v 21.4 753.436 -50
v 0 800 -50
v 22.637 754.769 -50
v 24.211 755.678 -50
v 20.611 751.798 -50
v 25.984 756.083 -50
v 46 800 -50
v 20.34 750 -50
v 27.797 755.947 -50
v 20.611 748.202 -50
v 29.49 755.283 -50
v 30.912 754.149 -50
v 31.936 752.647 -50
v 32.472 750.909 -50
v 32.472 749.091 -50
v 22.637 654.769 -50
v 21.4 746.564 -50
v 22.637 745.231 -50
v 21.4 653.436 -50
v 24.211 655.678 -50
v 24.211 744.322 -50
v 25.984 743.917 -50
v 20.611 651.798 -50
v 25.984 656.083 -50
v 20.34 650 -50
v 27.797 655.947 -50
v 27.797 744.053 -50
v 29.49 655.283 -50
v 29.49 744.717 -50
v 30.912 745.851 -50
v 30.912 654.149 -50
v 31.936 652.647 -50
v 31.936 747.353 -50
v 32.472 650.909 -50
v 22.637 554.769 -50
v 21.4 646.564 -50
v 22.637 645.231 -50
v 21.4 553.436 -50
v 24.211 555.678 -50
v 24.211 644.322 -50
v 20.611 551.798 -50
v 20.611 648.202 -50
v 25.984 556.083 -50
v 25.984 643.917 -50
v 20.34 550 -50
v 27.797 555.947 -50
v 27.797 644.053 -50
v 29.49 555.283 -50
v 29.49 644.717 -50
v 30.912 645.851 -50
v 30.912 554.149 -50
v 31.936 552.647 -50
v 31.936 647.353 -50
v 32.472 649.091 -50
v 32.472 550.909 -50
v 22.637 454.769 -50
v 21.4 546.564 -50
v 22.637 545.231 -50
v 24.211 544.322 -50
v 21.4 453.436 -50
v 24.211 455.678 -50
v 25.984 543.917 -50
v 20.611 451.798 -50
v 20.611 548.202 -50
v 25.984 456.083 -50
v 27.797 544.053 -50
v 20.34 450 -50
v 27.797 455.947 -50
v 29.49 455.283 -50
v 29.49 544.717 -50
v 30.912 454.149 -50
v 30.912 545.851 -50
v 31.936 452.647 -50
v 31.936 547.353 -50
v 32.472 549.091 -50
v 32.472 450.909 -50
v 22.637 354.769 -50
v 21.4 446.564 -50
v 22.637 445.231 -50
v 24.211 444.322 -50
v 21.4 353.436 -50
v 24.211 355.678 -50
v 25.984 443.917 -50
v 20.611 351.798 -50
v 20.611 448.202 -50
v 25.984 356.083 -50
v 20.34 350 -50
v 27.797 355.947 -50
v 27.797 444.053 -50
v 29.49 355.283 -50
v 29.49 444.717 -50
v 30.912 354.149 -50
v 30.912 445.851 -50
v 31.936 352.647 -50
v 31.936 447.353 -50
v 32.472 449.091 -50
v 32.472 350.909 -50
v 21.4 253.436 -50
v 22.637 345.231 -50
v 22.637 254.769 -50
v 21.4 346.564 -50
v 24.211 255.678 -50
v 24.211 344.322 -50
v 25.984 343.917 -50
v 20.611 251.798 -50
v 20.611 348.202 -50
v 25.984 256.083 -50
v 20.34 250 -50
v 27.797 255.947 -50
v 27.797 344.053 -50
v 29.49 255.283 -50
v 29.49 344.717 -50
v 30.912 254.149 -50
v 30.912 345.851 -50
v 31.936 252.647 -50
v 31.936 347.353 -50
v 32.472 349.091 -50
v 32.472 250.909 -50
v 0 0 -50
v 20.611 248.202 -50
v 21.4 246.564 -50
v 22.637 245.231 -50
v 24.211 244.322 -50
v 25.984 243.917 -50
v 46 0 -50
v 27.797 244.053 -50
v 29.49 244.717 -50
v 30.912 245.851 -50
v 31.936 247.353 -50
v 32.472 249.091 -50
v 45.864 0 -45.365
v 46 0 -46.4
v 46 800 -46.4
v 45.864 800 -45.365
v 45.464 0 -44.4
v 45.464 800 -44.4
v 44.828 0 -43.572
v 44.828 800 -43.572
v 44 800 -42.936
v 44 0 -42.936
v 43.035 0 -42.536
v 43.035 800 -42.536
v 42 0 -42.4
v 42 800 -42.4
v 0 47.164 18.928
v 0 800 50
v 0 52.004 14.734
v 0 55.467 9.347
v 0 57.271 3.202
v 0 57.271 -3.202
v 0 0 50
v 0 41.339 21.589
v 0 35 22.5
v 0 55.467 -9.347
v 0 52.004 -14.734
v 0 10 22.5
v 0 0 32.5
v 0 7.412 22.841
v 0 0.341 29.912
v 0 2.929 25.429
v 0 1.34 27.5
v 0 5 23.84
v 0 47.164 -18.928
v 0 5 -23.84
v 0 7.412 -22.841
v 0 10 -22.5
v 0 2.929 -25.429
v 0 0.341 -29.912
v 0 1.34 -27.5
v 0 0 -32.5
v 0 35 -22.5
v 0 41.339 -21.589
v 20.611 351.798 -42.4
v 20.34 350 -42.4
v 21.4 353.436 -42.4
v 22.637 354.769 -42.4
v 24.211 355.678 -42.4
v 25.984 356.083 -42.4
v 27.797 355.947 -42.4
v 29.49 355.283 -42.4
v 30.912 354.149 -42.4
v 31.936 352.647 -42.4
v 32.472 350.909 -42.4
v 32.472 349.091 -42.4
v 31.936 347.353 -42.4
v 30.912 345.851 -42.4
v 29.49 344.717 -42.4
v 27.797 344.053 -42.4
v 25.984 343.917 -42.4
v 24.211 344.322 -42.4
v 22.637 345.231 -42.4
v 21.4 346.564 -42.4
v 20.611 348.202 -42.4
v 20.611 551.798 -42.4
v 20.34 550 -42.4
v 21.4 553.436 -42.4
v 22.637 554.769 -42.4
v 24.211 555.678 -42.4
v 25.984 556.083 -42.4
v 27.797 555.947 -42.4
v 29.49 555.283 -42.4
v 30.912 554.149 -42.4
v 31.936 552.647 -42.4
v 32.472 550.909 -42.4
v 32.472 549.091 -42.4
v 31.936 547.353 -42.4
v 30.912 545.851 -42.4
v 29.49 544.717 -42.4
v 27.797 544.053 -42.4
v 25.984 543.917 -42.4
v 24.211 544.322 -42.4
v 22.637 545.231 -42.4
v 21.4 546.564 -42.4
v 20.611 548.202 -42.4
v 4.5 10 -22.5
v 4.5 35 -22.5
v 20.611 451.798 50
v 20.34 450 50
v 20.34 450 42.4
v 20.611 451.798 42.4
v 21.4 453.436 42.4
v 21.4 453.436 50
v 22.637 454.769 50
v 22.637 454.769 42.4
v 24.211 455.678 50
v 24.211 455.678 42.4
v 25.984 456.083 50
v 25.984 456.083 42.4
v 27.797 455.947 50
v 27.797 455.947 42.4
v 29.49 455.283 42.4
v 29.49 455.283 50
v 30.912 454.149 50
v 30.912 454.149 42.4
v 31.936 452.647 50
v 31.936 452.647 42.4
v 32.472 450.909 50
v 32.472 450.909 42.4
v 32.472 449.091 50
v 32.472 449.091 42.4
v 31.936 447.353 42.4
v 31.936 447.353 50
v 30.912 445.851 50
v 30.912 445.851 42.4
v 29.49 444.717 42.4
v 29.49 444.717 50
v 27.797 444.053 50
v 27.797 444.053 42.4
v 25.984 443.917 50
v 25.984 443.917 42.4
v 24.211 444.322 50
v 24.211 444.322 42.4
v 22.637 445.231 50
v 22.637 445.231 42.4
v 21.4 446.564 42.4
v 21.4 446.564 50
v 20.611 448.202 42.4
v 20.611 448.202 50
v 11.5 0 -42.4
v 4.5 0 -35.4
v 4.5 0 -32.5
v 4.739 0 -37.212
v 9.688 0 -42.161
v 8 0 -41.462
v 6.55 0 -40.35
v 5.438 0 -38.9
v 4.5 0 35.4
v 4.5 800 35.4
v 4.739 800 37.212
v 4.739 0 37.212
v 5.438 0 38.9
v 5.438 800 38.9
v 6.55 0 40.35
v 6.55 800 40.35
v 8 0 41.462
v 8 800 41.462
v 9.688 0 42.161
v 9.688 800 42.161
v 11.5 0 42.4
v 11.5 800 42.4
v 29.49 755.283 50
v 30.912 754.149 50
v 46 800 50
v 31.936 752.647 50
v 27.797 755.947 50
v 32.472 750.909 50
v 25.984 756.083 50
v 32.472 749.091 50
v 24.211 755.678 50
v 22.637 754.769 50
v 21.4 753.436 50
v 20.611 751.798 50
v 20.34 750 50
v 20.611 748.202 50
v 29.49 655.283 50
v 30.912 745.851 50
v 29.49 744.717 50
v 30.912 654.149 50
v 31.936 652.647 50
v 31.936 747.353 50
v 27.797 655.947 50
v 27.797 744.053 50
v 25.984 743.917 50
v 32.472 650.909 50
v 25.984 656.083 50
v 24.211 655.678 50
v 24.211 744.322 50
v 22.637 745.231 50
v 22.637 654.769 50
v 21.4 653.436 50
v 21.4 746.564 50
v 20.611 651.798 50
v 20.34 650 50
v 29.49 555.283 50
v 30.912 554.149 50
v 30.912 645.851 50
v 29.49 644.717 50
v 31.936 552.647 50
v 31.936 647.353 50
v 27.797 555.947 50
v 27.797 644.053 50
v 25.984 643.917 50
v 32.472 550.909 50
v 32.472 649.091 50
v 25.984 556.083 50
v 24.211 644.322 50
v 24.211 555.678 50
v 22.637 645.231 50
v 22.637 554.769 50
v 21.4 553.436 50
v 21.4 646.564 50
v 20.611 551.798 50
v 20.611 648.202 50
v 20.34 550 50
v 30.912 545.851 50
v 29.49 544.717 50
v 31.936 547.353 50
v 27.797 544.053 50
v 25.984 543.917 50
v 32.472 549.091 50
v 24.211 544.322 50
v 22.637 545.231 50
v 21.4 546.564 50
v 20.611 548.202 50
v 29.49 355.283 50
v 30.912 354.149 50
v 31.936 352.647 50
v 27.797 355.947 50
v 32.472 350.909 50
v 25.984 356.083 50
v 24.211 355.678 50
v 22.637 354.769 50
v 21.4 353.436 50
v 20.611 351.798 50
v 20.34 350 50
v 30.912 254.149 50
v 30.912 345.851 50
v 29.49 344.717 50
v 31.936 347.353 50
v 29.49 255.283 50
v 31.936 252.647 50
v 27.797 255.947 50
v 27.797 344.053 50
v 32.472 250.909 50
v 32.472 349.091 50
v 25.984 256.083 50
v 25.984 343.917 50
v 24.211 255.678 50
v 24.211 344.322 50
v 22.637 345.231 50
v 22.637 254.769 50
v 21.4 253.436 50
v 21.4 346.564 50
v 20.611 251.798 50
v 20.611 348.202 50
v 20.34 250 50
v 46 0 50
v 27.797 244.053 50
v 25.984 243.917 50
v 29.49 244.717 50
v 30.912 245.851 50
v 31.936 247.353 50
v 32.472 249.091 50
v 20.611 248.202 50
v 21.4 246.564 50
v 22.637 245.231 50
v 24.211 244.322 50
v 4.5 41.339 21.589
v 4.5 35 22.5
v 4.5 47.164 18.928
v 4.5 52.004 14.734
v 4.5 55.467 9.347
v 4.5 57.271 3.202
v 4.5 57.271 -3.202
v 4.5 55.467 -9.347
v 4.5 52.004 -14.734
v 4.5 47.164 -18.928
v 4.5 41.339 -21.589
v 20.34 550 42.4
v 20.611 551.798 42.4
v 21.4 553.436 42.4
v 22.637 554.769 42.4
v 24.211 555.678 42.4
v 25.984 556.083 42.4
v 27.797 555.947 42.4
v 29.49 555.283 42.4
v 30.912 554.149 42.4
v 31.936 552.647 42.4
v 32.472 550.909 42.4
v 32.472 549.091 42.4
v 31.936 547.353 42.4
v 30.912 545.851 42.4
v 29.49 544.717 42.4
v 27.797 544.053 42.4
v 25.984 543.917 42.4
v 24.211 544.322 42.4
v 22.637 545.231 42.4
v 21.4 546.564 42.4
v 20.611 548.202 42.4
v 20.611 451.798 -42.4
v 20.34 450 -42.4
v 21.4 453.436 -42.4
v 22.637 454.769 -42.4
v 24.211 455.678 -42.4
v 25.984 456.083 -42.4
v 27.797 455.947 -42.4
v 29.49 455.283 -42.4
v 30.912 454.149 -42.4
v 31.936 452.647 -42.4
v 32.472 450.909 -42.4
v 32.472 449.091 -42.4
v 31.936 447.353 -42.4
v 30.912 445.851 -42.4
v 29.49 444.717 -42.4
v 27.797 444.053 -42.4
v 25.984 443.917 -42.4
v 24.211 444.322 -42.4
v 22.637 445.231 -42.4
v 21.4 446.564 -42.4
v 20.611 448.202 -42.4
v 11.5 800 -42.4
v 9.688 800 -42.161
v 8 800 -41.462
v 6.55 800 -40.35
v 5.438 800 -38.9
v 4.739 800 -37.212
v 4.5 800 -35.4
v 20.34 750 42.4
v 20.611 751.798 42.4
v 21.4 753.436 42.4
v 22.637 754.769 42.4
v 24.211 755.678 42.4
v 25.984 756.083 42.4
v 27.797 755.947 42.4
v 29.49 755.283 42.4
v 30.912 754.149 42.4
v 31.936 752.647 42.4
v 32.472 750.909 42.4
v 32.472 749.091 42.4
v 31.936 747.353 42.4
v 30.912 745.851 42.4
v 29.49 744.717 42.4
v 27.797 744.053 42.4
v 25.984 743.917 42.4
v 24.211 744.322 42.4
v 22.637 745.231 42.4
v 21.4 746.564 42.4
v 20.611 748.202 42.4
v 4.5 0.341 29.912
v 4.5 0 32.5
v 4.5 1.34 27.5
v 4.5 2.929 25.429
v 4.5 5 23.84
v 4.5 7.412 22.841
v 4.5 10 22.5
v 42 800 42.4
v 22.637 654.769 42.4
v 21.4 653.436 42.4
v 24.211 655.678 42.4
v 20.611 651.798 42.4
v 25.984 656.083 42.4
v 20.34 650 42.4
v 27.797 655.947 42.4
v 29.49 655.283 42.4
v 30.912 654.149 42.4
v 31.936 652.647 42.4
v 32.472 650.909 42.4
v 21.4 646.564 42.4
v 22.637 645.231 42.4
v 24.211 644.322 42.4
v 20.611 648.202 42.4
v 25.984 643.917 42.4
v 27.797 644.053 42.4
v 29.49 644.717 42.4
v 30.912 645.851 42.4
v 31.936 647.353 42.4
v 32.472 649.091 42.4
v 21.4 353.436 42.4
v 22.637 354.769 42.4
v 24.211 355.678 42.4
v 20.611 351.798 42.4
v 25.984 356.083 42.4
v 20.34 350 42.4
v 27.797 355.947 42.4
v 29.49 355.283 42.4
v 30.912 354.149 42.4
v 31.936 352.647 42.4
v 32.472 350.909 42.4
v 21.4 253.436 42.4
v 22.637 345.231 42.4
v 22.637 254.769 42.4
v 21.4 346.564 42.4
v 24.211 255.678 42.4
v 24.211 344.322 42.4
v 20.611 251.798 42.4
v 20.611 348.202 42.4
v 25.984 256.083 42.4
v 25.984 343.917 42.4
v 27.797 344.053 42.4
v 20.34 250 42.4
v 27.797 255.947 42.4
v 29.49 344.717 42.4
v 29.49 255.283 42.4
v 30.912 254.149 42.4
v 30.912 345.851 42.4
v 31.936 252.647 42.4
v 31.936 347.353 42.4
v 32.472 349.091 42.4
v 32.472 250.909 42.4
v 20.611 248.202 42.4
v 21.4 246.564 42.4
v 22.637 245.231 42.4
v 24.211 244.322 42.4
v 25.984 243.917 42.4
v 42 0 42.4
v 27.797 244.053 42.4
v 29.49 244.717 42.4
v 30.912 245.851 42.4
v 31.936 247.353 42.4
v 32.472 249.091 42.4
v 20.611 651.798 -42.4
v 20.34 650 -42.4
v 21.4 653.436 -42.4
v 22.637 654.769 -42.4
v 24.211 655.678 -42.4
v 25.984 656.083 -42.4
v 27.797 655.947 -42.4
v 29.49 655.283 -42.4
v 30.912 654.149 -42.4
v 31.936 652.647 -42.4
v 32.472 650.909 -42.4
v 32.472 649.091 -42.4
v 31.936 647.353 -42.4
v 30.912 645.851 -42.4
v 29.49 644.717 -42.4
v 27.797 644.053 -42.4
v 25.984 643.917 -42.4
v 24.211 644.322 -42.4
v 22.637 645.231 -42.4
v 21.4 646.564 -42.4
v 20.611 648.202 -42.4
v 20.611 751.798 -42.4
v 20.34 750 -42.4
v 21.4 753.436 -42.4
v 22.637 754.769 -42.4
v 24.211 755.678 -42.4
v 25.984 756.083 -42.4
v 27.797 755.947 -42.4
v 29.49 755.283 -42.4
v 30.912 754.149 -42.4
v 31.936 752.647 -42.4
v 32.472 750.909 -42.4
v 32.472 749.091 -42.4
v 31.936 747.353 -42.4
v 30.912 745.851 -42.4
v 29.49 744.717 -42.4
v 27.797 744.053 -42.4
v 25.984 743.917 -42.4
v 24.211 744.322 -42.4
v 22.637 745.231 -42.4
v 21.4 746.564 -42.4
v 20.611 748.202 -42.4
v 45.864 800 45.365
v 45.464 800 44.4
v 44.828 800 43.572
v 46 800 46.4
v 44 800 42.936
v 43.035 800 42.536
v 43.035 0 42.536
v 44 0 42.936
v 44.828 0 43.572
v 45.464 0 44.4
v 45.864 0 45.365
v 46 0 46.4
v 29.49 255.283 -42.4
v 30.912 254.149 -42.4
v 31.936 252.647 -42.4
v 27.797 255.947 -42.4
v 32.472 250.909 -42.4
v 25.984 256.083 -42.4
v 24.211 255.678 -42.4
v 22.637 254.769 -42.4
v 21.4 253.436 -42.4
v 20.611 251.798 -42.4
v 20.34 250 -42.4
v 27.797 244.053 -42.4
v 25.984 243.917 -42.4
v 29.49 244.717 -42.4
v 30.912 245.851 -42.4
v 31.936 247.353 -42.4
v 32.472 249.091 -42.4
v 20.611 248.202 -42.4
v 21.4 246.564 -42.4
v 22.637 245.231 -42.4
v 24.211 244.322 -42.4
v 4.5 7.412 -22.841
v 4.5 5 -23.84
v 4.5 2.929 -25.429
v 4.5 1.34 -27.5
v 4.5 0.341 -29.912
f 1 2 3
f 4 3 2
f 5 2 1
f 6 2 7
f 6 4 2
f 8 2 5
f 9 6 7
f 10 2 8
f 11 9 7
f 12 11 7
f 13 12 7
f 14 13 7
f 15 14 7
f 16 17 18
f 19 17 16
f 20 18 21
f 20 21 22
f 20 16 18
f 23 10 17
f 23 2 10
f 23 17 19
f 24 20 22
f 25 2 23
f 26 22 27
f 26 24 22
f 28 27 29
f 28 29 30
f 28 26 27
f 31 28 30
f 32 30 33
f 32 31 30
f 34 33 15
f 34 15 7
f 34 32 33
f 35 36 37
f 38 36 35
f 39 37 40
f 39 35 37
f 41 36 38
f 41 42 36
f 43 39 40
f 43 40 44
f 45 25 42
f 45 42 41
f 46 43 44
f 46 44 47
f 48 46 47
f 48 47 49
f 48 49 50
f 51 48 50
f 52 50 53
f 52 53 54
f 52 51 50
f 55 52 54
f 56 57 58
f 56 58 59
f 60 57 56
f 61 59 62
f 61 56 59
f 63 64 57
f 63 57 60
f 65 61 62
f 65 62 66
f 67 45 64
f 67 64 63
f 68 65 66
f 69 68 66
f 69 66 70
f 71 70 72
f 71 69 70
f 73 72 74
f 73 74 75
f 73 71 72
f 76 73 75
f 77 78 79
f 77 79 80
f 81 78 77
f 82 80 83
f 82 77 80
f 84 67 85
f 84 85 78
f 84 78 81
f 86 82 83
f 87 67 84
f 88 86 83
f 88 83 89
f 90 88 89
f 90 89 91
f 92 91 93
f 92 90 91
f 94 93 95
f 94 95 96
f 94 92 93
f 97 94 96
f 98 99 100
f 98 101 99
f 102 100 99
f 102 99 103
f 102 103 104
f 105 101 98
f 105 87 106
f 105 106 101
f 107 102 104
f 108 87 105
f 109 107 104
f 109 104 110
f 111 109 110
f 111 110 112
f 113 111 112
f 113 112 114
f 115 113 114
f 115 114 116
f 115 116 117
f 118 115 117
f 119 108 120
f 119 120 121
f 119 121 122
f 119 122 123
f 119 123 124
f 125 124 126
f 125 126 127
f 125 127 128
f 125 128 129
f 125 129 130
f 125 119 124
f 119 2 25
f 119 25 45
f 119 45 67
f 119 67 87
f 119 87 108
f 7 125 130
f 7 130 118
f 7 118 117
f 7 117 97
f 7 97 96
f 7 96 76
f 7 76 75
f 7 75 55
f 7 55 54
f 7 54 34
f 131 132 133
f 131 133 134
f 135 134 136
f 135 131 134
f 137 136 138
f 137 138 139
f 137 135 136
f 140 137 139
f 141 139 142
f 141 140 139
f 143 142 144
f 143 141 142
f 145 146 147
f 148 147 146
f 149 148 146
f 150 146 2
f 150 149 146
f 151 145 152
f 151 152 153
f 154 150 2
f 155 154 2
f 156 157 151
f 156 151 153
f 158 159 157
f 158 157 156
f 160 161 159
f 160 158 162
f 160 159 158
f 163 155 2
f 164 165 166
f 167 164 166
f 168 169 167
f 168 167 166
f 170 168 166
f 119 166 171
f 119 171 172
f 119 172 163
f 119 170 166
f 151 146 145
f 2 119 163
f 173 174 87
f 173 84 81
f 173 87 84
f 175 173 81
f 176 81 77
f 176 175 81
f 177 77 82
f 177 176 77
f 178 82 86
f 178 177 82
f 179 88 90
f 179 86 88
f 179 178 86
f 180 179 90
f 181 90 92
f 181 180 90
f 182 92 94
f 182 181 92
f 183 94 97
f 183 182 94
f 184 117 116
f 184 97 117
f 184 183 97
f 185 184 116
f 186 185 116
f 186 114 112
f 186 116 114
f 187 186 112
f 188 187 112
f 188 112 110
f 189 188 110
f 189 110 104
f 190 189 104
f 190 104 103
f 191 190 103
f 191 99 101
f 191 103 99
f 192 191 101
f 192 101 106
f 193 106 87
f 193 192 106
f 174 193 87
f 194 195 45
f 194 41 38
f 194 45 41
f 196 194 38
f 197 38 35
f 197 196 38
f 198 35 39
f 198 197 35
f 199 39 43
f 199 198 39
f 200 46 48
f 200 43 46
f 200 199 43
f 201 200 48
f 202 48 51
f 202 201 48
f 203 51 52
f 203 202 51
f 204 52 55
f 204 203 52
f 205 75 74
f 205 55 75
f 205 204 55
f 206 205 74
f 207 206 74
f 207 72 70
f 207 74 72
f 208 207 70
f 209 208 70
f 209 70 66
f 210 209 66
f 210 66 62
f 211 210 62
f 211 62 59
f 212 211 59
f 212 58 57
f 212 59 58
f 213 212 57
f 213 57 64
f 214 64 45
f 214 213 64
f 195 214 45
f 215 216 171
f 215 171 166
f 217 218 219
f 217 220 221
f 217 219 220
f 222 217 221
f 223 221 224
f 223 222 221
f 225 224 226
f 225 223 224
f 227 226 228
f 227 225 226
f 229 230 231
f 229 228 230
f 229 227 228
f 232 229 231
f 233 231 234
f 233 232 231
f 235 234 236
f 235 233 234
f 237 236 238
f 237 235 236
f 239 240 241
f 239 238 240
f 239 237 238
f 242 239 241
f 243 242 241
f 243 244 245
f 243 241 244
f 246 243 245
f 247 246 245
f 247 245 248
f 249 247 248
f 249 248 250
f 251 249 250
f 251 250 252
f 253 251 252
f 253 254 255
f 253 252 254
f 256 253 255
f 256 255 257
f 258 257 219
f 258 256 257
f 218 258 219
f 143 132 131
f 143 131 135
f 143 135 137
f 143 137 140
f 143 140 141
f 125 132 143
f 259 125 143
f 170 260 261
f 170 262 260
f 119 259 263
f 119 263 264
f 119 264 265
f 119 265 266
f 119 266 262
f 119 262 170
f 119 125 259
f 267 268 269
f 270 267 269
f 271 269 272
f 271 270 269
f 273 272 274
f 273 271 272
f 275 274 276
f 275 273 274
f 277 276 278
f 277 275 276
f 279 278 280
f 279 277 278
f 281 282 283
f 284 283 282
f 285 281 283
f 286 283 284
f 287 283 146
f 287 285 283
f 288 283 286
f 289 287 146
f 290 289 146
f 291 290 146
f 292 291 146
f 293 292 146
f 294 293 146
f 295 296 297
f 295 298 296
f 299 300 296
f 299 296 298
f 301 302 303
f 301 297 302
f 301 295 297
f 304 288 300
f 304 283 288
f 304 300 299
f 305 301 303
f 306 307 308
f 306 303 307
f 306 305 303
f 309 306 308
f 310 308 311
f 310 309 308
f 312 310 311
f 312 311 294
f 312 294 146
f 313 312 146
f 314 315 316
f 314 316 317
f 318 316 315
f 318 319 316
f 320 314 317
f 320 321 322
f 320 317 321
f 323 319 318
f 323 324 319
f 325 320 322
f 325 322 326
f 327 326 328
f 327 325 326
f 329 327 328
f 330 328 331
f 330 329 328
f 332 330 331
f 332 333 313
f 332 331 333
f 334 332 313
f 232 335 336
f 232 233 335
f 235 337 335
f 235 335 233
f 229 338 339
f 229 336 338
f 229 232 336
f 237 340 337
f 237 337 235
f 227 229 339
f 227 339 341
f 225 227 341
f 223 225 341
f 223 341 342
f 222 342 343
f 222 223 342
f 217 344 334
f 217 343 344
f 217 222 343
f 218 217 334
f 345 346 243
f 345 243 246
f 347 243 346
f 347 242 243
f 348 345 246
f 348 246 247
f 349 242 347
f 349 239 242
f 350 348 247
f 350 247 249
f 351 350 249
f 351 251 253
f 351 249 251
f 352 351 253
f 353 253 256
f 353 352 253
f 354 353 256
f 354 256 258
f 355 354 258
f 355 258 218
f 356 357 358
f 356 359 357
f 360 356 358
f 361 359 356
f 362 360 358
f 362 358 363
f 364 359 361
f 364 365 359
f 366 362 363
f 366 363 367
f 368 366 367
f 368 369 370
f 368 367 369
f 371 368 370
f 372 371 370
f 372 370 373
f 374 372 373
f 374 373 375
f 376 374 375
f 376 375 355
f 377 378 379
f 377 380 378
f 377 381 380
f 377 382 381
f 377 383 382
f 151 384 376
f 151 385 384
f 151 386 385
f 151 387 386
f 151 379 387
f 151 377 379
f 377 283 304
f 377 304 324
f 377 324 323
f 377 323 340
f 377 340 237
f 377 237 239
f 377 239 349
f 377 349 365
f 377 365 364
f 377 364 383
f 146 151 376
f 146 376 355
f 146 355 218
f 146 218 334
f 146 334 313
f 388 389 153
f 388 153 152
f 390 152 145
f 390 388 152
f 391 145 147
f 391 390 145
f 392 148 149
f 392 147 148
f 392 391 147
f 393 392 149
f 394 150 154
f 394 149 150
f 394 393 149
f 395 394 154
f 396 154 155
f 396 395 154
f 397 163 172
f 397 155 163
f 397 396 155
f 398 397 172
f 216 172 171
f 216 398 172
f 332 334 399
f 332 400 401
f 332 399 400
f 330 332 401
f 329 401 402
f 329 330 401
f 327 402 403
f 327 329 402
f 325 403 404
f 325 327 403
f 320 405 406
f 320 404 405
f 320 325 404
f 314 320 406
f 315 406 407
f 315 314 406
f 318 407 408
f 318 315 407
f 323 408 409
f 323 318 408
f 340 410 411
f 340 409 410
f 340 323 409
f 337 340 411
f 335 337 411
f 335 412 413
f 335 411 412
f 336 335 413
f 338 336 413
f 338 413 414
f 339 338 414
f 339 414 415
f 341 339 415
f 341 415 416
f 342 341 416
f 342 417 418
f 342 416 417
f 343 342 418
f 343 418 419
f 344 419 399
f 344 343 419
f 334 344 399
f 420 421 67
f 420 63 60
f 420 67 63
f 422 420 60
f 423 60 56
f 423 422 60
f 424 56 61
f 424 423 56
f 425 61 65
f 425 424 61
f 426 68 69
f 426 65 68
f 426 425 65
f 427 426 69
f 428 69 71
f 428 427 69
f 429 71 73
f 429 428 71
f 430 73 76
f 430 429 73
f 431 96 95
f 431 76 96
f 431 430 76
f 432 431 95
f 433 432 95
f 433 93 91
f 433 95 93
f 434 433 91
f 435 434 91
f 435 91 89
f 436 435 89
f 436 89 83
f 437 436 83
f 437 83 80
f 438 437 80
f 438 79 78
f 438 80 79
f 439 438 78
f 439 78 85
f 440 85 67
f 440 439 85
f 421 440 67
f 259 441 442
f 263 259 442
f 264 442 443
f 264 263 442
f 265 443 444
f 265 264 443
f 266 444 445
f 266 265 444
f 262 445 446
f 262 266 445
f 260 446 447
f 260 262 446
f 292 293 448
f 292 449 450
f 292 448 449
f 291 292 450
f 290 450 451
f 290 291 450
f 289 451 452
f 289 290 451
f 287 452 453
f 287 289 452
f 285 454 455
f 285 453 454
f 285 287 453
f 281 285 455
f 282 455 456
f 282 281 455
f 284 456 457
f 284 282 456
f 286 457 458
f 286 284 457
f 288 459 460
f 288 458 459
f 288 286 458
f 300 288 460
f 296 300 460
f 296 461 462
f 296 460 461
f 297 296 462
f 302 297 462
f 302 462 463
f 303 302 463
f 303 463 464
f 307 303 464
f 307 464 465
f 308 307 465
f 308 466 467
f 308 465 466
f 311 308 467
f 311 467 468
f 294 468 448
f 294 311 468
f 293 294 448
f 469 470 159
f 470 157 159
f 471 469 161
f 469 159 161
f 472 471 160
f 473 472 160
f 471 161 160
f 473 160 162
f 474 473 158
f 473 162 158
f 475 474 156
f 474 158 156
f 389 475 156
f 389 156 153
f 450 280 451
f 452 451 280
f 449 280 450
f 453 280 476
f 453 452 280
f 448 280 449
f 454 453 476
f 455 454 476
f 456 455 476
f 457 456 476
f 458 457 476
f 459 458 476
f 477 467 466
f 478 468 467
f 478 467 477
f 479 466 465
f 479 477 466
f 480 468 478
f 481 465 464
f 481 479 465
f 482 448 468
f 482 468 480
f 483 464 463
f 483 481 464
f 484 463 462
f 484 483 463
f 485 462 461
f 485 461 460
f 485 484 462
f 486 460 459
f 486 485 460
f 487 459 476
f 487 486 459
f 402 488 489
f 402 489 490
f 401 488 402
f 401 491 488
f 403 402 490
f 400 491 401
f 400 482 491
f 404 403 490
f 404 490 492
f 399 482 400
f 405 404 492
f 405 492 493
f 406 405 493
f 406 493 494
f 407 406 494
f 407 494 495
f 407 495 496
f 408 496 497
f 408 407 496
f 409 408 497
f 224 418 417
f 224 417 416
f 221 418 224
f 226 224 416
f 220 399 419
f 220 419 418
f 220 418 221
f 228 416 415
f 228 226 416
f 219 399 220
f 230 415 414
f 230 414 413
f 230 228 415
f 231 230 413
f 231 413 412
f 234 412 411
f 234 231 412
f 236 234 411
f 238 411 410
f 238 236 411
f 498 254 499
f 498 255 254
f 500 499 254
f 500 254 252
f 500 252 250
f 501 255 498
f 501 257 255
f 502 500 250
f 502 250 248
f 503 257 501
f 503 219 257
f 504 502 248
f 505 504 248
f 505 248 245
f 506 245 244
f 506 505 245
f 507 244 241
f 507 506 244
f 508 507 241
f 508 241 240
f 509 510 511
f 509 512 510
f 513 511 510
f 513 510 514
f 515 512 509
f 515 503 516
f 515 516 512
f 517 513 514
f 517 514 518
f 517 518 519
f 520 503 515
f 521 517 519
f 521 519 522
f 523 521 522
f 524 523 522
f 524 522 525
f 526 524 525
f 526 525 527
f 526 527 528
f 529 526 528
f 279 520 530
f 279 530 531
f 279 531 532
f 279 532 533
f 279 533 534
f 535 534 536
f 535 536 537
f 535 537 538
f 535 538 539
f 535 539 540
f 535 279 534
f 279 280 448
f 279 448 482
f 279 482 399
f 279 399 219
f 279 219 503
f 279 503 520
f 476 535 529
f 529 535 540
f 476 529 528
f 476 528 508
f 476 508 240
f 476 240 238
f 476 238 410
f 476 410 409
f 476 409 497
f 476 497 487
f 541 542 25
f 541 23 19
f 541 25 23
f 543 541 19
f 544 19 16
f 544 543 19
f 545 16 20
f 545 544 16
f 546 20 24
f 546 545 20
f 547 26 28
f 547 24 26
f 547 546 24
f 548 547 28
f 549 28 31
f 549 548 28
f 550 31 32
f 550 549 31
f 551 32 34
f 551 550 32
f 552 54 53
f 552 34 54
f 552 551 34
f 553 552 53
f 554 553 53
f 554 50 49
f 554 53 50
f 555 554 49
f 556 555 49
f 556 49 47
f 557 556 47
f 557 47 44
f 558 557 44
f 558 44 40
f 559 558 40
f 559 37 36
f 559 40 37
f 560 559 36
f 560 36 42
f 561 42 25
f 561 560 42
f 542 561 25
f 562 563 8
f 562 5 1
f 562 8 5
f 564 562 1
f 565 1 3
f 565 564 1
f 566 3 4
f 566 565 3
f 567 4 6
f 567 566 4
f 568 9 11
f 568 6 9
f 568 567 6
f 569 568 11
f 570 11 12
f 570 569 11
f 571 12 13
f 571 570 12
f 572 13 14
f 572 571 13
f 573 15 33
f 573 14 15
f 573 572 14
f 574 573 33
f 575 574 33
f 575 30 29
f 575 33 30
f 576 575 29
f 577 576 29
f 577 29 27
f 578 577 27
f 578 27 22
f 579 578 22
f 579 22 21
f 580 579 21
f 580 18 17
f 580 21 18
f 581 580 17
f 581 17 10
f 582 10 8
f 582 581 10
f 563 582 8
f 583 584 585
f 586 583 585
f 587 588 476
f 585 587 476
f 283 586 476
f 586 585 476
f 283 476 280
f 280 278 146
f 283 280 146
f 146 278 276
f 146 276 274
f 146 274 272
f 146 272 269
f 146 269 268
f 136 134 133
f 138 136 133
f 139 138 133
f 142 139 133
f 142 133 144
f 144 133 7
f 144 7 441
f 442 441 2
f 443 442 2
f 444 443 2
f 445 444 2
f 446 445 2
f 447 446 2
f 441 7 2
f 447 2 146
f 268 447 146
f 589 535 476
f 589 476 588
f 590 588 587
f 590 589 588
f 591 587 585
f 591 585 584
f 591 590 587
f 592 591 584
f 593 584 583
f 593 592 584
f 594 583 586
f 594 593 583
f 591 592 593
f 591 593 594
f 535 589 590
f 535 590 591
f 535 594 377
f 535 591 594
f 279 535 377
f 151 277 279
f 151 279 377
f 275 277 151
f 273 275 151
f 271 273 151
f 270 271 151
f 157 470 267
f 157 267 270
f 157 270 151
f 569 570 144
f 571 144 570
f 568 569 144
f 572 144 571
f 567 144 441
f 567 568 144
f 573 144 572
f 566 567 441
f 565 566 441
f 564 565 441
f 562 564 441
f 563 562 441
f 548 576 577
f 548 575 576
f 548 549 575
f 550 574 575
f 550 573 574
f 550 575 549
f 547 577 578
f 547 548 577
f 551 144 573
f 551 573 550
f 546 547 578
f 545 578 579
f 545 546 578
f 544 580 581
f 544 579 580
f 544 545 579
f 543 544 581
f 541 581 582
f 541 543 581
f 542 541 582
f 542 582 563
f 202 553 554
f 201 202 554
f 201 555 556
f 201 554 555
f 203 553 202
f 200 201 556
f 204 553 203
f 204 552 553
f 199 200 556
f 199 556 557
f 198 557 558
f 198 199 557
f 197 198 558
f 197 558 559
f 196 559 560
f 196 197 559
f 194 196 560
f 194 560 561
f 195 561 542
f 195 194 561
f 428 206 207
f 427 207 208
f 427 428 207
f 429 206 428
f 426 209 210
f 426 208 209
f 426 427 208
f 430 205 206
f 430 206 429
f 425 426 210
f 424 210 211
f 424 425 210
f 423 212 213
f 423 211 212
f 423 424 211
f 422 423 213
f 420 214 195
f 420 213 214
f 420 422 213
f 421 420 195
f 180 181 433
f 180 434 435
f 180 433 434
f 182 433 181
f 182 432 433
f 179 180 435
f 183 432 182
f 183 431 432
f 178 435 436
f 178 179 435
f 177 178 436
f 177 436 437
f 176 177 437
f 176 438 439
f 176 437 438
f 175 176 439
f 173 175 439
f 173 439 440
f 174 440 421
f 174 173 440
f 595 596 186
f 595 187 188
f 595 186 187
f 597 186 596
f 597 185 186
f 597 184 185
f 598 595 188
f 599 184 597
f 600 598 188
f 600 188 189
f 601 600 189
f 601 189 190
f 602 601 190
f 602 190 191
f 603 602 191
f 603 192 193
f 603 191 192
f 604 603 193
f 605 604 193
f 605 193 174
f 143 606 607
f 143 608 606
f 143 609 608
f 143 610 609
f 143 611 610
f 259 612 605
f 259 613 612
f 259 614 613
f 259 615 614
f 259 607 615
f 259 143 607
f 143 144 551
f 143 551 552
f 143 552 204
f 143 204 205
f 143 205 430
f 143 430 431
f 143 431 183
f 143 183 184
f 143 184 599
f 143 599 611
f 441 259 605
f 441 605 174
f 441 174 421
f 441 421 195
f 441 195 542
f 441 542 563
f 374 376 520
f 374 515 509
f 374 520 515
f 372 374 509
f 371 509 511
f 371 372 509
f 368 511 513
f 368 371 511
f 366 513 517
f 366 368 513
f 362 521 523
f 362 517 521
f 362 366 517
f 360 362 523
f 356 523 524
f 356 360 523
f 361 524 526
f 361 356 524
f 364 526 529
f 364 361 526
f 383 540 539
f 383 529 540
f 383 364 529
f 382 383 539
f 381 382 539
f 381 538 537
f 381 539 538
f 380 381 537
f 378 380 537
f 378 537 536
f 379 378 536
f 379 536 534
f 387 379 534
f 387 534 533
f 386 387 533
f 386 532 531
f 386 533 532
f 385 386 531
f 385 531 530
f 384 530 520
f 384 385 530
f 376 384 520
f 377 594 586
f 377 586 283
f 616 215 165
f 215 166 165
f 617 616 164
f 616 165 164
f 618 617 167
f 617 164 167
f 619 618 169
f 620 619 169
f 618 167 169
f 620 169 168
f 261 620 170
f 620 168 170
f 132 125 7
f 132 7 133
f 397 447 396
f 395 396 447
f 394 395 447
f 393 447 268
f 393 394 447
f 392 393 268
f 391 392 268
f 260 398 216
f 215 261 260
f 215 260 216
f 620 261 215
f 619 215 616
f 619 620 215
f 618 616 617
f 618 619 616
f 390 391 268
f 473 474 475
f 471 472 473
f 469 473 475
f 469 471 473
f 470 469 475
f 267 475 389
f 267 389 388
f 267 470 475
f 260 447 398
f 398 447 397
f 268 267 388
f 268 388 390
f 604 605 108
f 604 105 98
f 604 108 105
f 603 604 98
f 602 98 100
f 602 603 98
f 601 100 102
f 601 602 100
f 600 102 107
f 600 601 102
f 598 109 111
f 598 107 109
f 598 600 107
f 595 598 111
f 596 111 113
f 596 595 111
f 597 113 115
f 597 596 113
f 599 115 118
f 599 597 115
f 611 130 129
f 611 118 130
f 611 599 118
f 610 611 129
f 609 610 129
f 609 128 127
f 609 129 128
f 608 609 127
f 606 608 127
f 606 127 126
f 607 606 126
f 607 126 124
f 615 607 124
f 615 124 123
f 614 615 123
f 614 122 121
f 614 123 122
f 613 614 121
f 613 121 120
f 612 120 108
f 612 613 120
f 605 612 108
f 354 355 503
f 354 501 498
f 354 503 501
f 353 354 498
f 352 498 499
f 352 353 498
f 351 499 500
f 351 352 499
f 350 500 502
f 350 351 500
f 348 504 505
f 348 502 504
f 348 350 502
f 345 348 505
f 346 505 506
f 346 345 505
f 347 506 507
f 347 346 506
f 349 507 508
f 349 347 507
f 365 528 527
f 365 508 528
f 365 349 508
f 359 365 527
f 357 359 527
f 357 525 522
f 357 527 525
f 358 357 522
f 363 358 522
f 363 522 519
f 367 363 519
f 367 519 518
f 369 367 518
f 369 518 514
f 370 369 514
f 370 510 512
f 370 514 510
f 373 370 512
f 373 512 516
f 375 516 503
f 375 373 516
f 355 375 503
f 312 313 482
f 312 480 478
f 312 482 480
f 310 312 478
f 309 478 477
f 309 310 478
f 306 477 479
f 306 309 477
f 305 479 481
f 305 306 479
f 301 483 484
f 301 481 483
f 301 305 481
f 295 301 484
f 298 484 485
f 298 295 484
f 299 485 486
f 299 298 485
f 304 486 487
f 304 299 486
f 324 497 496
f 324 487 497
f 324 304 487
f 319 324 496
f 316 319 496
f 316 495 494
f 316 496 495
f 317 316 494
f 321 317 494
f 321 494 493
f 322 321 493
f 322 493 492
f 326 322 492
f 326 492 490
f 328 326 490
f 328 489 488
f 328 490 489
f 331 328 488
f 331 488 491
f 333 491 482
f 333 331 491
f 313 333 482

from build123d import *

# Parameters (mm, degrees)
EXTRUDE_1_DEPTH          = 800
CUT_EXTRUDE_1_DEPTH      = 803.87981666
CUT_EXTRUDE_1_DEPTH_BACK = 803.87981666
FILLET_1_R               = 10
CUT_EXTRUDE_2_DEPTH      = 808.536996057
CUT_EXTRUDE_2_DEPTH_BACK = 808.536996057
SKETCH_3_R               = 6.1


with BuildPart() as part:
    # Эскиз1 → Бобышка-Вытянуть1 (new body)
    with BuildSketch(Plane(origin=(0, 0, 0), x_dir=(1, 0, 0), z_dir=(0, 1, 0))):
        with BuildLine():
            Line((0, -50), (0, 50))
            Line((0, 50), (46, 50))
            Line((46, 50), (46, 46.4))
            ThreePointArc((46, 46.4), (44.828427125, 43.571572875), (42, 42.4))
            Line((42, 42.4), (11.5, 42.4))
            ThreePointArc((11.5, 42.4), (6.550252532, 40.349747468), (4.5, 35.4))
            Line((4.5, 35.4), (4.5, -35.4))
            ThreePointArc((4.5, -35.4), (6.550252532, -40.349747468), (11.5, -42.4))
            Line((11.5, -42.4), (42, -42.4))
            ThreePointArc((42, -42.4), (44.828427125, -43.571572875), (46, -46.4))
            Line((46, -46.4), (46, -50))
            Line((46, -50), (0, -50))
        make_face()
    extrude(amount=EXTRUDE_1_DEPTH)

    # Эскиз2 → Вырез-Вытянуть1 (cut, two sides: drawn at the far end of the back side and taken through both)
    with BuildSketch(Plane.ZY.offset(-CUT_EXTRUDE_1_DEPTH_BACK)):
        with BuildLine():
            Line((-22.5, 35), (-22.5, 0))
            Line((-22.5, 0), (22.5, 0))
            Line((22.5, 0), (22.5, 35))
            ThreePointArc((22.5, 35), (0, 57.5), (-22.5, 35))
        make_face()
    extrude(amount=CUT_EXTRUDE_1_DEPTH + CUT_EXTRUDE_1_DEPTH_BACK, mode=Mode.SUBTRACT)

    # Скругление1
    fillet_1_edges = [part.edges().sort_by_distance(p)[0] for p in [
        (2.25, 0, -22.5),
        (2.25, 0, 22.5),
    ]]
    fillet(fillet_1_edges, radius=FILLET_1_R)

    # Эскиз3 → Вырез-Вытянуть2 (cut, two sides: drawn at the far end of the back side and taken through both)
    with BuildSketch(Plane(origin=(0, 0, -50), x_dir=(-1, 0, 0), z_dir=(0, 0, -1)).offset(-CUT_EXTRUDE_2_DEPTH_BACK)):
        with Locations((-26.44, 750)):
            Circle(SKETCH_3_R)
        with Locations((-26.44, 650)):
            Circle(SKETCH_3_R)
        with Locations((-26.44, 550)):
            Circle(SKETCH_3_R)
        with Locations((-26.44, 450)):
            Circle(SKETCH_3_R)
        with Locations((-26.44, 350)):
            Circle(SKETCH_3_R)
        with Locations((-26.44, 250)):
            Circle(SKETCH_3_R)
    extrude(amount=CUT_EXTRUDE_2_DEPTH + CUT_EXTRUDE_2_DEPTH_BACK, mode=Mode.SUBTRACT)


solid = part.part
